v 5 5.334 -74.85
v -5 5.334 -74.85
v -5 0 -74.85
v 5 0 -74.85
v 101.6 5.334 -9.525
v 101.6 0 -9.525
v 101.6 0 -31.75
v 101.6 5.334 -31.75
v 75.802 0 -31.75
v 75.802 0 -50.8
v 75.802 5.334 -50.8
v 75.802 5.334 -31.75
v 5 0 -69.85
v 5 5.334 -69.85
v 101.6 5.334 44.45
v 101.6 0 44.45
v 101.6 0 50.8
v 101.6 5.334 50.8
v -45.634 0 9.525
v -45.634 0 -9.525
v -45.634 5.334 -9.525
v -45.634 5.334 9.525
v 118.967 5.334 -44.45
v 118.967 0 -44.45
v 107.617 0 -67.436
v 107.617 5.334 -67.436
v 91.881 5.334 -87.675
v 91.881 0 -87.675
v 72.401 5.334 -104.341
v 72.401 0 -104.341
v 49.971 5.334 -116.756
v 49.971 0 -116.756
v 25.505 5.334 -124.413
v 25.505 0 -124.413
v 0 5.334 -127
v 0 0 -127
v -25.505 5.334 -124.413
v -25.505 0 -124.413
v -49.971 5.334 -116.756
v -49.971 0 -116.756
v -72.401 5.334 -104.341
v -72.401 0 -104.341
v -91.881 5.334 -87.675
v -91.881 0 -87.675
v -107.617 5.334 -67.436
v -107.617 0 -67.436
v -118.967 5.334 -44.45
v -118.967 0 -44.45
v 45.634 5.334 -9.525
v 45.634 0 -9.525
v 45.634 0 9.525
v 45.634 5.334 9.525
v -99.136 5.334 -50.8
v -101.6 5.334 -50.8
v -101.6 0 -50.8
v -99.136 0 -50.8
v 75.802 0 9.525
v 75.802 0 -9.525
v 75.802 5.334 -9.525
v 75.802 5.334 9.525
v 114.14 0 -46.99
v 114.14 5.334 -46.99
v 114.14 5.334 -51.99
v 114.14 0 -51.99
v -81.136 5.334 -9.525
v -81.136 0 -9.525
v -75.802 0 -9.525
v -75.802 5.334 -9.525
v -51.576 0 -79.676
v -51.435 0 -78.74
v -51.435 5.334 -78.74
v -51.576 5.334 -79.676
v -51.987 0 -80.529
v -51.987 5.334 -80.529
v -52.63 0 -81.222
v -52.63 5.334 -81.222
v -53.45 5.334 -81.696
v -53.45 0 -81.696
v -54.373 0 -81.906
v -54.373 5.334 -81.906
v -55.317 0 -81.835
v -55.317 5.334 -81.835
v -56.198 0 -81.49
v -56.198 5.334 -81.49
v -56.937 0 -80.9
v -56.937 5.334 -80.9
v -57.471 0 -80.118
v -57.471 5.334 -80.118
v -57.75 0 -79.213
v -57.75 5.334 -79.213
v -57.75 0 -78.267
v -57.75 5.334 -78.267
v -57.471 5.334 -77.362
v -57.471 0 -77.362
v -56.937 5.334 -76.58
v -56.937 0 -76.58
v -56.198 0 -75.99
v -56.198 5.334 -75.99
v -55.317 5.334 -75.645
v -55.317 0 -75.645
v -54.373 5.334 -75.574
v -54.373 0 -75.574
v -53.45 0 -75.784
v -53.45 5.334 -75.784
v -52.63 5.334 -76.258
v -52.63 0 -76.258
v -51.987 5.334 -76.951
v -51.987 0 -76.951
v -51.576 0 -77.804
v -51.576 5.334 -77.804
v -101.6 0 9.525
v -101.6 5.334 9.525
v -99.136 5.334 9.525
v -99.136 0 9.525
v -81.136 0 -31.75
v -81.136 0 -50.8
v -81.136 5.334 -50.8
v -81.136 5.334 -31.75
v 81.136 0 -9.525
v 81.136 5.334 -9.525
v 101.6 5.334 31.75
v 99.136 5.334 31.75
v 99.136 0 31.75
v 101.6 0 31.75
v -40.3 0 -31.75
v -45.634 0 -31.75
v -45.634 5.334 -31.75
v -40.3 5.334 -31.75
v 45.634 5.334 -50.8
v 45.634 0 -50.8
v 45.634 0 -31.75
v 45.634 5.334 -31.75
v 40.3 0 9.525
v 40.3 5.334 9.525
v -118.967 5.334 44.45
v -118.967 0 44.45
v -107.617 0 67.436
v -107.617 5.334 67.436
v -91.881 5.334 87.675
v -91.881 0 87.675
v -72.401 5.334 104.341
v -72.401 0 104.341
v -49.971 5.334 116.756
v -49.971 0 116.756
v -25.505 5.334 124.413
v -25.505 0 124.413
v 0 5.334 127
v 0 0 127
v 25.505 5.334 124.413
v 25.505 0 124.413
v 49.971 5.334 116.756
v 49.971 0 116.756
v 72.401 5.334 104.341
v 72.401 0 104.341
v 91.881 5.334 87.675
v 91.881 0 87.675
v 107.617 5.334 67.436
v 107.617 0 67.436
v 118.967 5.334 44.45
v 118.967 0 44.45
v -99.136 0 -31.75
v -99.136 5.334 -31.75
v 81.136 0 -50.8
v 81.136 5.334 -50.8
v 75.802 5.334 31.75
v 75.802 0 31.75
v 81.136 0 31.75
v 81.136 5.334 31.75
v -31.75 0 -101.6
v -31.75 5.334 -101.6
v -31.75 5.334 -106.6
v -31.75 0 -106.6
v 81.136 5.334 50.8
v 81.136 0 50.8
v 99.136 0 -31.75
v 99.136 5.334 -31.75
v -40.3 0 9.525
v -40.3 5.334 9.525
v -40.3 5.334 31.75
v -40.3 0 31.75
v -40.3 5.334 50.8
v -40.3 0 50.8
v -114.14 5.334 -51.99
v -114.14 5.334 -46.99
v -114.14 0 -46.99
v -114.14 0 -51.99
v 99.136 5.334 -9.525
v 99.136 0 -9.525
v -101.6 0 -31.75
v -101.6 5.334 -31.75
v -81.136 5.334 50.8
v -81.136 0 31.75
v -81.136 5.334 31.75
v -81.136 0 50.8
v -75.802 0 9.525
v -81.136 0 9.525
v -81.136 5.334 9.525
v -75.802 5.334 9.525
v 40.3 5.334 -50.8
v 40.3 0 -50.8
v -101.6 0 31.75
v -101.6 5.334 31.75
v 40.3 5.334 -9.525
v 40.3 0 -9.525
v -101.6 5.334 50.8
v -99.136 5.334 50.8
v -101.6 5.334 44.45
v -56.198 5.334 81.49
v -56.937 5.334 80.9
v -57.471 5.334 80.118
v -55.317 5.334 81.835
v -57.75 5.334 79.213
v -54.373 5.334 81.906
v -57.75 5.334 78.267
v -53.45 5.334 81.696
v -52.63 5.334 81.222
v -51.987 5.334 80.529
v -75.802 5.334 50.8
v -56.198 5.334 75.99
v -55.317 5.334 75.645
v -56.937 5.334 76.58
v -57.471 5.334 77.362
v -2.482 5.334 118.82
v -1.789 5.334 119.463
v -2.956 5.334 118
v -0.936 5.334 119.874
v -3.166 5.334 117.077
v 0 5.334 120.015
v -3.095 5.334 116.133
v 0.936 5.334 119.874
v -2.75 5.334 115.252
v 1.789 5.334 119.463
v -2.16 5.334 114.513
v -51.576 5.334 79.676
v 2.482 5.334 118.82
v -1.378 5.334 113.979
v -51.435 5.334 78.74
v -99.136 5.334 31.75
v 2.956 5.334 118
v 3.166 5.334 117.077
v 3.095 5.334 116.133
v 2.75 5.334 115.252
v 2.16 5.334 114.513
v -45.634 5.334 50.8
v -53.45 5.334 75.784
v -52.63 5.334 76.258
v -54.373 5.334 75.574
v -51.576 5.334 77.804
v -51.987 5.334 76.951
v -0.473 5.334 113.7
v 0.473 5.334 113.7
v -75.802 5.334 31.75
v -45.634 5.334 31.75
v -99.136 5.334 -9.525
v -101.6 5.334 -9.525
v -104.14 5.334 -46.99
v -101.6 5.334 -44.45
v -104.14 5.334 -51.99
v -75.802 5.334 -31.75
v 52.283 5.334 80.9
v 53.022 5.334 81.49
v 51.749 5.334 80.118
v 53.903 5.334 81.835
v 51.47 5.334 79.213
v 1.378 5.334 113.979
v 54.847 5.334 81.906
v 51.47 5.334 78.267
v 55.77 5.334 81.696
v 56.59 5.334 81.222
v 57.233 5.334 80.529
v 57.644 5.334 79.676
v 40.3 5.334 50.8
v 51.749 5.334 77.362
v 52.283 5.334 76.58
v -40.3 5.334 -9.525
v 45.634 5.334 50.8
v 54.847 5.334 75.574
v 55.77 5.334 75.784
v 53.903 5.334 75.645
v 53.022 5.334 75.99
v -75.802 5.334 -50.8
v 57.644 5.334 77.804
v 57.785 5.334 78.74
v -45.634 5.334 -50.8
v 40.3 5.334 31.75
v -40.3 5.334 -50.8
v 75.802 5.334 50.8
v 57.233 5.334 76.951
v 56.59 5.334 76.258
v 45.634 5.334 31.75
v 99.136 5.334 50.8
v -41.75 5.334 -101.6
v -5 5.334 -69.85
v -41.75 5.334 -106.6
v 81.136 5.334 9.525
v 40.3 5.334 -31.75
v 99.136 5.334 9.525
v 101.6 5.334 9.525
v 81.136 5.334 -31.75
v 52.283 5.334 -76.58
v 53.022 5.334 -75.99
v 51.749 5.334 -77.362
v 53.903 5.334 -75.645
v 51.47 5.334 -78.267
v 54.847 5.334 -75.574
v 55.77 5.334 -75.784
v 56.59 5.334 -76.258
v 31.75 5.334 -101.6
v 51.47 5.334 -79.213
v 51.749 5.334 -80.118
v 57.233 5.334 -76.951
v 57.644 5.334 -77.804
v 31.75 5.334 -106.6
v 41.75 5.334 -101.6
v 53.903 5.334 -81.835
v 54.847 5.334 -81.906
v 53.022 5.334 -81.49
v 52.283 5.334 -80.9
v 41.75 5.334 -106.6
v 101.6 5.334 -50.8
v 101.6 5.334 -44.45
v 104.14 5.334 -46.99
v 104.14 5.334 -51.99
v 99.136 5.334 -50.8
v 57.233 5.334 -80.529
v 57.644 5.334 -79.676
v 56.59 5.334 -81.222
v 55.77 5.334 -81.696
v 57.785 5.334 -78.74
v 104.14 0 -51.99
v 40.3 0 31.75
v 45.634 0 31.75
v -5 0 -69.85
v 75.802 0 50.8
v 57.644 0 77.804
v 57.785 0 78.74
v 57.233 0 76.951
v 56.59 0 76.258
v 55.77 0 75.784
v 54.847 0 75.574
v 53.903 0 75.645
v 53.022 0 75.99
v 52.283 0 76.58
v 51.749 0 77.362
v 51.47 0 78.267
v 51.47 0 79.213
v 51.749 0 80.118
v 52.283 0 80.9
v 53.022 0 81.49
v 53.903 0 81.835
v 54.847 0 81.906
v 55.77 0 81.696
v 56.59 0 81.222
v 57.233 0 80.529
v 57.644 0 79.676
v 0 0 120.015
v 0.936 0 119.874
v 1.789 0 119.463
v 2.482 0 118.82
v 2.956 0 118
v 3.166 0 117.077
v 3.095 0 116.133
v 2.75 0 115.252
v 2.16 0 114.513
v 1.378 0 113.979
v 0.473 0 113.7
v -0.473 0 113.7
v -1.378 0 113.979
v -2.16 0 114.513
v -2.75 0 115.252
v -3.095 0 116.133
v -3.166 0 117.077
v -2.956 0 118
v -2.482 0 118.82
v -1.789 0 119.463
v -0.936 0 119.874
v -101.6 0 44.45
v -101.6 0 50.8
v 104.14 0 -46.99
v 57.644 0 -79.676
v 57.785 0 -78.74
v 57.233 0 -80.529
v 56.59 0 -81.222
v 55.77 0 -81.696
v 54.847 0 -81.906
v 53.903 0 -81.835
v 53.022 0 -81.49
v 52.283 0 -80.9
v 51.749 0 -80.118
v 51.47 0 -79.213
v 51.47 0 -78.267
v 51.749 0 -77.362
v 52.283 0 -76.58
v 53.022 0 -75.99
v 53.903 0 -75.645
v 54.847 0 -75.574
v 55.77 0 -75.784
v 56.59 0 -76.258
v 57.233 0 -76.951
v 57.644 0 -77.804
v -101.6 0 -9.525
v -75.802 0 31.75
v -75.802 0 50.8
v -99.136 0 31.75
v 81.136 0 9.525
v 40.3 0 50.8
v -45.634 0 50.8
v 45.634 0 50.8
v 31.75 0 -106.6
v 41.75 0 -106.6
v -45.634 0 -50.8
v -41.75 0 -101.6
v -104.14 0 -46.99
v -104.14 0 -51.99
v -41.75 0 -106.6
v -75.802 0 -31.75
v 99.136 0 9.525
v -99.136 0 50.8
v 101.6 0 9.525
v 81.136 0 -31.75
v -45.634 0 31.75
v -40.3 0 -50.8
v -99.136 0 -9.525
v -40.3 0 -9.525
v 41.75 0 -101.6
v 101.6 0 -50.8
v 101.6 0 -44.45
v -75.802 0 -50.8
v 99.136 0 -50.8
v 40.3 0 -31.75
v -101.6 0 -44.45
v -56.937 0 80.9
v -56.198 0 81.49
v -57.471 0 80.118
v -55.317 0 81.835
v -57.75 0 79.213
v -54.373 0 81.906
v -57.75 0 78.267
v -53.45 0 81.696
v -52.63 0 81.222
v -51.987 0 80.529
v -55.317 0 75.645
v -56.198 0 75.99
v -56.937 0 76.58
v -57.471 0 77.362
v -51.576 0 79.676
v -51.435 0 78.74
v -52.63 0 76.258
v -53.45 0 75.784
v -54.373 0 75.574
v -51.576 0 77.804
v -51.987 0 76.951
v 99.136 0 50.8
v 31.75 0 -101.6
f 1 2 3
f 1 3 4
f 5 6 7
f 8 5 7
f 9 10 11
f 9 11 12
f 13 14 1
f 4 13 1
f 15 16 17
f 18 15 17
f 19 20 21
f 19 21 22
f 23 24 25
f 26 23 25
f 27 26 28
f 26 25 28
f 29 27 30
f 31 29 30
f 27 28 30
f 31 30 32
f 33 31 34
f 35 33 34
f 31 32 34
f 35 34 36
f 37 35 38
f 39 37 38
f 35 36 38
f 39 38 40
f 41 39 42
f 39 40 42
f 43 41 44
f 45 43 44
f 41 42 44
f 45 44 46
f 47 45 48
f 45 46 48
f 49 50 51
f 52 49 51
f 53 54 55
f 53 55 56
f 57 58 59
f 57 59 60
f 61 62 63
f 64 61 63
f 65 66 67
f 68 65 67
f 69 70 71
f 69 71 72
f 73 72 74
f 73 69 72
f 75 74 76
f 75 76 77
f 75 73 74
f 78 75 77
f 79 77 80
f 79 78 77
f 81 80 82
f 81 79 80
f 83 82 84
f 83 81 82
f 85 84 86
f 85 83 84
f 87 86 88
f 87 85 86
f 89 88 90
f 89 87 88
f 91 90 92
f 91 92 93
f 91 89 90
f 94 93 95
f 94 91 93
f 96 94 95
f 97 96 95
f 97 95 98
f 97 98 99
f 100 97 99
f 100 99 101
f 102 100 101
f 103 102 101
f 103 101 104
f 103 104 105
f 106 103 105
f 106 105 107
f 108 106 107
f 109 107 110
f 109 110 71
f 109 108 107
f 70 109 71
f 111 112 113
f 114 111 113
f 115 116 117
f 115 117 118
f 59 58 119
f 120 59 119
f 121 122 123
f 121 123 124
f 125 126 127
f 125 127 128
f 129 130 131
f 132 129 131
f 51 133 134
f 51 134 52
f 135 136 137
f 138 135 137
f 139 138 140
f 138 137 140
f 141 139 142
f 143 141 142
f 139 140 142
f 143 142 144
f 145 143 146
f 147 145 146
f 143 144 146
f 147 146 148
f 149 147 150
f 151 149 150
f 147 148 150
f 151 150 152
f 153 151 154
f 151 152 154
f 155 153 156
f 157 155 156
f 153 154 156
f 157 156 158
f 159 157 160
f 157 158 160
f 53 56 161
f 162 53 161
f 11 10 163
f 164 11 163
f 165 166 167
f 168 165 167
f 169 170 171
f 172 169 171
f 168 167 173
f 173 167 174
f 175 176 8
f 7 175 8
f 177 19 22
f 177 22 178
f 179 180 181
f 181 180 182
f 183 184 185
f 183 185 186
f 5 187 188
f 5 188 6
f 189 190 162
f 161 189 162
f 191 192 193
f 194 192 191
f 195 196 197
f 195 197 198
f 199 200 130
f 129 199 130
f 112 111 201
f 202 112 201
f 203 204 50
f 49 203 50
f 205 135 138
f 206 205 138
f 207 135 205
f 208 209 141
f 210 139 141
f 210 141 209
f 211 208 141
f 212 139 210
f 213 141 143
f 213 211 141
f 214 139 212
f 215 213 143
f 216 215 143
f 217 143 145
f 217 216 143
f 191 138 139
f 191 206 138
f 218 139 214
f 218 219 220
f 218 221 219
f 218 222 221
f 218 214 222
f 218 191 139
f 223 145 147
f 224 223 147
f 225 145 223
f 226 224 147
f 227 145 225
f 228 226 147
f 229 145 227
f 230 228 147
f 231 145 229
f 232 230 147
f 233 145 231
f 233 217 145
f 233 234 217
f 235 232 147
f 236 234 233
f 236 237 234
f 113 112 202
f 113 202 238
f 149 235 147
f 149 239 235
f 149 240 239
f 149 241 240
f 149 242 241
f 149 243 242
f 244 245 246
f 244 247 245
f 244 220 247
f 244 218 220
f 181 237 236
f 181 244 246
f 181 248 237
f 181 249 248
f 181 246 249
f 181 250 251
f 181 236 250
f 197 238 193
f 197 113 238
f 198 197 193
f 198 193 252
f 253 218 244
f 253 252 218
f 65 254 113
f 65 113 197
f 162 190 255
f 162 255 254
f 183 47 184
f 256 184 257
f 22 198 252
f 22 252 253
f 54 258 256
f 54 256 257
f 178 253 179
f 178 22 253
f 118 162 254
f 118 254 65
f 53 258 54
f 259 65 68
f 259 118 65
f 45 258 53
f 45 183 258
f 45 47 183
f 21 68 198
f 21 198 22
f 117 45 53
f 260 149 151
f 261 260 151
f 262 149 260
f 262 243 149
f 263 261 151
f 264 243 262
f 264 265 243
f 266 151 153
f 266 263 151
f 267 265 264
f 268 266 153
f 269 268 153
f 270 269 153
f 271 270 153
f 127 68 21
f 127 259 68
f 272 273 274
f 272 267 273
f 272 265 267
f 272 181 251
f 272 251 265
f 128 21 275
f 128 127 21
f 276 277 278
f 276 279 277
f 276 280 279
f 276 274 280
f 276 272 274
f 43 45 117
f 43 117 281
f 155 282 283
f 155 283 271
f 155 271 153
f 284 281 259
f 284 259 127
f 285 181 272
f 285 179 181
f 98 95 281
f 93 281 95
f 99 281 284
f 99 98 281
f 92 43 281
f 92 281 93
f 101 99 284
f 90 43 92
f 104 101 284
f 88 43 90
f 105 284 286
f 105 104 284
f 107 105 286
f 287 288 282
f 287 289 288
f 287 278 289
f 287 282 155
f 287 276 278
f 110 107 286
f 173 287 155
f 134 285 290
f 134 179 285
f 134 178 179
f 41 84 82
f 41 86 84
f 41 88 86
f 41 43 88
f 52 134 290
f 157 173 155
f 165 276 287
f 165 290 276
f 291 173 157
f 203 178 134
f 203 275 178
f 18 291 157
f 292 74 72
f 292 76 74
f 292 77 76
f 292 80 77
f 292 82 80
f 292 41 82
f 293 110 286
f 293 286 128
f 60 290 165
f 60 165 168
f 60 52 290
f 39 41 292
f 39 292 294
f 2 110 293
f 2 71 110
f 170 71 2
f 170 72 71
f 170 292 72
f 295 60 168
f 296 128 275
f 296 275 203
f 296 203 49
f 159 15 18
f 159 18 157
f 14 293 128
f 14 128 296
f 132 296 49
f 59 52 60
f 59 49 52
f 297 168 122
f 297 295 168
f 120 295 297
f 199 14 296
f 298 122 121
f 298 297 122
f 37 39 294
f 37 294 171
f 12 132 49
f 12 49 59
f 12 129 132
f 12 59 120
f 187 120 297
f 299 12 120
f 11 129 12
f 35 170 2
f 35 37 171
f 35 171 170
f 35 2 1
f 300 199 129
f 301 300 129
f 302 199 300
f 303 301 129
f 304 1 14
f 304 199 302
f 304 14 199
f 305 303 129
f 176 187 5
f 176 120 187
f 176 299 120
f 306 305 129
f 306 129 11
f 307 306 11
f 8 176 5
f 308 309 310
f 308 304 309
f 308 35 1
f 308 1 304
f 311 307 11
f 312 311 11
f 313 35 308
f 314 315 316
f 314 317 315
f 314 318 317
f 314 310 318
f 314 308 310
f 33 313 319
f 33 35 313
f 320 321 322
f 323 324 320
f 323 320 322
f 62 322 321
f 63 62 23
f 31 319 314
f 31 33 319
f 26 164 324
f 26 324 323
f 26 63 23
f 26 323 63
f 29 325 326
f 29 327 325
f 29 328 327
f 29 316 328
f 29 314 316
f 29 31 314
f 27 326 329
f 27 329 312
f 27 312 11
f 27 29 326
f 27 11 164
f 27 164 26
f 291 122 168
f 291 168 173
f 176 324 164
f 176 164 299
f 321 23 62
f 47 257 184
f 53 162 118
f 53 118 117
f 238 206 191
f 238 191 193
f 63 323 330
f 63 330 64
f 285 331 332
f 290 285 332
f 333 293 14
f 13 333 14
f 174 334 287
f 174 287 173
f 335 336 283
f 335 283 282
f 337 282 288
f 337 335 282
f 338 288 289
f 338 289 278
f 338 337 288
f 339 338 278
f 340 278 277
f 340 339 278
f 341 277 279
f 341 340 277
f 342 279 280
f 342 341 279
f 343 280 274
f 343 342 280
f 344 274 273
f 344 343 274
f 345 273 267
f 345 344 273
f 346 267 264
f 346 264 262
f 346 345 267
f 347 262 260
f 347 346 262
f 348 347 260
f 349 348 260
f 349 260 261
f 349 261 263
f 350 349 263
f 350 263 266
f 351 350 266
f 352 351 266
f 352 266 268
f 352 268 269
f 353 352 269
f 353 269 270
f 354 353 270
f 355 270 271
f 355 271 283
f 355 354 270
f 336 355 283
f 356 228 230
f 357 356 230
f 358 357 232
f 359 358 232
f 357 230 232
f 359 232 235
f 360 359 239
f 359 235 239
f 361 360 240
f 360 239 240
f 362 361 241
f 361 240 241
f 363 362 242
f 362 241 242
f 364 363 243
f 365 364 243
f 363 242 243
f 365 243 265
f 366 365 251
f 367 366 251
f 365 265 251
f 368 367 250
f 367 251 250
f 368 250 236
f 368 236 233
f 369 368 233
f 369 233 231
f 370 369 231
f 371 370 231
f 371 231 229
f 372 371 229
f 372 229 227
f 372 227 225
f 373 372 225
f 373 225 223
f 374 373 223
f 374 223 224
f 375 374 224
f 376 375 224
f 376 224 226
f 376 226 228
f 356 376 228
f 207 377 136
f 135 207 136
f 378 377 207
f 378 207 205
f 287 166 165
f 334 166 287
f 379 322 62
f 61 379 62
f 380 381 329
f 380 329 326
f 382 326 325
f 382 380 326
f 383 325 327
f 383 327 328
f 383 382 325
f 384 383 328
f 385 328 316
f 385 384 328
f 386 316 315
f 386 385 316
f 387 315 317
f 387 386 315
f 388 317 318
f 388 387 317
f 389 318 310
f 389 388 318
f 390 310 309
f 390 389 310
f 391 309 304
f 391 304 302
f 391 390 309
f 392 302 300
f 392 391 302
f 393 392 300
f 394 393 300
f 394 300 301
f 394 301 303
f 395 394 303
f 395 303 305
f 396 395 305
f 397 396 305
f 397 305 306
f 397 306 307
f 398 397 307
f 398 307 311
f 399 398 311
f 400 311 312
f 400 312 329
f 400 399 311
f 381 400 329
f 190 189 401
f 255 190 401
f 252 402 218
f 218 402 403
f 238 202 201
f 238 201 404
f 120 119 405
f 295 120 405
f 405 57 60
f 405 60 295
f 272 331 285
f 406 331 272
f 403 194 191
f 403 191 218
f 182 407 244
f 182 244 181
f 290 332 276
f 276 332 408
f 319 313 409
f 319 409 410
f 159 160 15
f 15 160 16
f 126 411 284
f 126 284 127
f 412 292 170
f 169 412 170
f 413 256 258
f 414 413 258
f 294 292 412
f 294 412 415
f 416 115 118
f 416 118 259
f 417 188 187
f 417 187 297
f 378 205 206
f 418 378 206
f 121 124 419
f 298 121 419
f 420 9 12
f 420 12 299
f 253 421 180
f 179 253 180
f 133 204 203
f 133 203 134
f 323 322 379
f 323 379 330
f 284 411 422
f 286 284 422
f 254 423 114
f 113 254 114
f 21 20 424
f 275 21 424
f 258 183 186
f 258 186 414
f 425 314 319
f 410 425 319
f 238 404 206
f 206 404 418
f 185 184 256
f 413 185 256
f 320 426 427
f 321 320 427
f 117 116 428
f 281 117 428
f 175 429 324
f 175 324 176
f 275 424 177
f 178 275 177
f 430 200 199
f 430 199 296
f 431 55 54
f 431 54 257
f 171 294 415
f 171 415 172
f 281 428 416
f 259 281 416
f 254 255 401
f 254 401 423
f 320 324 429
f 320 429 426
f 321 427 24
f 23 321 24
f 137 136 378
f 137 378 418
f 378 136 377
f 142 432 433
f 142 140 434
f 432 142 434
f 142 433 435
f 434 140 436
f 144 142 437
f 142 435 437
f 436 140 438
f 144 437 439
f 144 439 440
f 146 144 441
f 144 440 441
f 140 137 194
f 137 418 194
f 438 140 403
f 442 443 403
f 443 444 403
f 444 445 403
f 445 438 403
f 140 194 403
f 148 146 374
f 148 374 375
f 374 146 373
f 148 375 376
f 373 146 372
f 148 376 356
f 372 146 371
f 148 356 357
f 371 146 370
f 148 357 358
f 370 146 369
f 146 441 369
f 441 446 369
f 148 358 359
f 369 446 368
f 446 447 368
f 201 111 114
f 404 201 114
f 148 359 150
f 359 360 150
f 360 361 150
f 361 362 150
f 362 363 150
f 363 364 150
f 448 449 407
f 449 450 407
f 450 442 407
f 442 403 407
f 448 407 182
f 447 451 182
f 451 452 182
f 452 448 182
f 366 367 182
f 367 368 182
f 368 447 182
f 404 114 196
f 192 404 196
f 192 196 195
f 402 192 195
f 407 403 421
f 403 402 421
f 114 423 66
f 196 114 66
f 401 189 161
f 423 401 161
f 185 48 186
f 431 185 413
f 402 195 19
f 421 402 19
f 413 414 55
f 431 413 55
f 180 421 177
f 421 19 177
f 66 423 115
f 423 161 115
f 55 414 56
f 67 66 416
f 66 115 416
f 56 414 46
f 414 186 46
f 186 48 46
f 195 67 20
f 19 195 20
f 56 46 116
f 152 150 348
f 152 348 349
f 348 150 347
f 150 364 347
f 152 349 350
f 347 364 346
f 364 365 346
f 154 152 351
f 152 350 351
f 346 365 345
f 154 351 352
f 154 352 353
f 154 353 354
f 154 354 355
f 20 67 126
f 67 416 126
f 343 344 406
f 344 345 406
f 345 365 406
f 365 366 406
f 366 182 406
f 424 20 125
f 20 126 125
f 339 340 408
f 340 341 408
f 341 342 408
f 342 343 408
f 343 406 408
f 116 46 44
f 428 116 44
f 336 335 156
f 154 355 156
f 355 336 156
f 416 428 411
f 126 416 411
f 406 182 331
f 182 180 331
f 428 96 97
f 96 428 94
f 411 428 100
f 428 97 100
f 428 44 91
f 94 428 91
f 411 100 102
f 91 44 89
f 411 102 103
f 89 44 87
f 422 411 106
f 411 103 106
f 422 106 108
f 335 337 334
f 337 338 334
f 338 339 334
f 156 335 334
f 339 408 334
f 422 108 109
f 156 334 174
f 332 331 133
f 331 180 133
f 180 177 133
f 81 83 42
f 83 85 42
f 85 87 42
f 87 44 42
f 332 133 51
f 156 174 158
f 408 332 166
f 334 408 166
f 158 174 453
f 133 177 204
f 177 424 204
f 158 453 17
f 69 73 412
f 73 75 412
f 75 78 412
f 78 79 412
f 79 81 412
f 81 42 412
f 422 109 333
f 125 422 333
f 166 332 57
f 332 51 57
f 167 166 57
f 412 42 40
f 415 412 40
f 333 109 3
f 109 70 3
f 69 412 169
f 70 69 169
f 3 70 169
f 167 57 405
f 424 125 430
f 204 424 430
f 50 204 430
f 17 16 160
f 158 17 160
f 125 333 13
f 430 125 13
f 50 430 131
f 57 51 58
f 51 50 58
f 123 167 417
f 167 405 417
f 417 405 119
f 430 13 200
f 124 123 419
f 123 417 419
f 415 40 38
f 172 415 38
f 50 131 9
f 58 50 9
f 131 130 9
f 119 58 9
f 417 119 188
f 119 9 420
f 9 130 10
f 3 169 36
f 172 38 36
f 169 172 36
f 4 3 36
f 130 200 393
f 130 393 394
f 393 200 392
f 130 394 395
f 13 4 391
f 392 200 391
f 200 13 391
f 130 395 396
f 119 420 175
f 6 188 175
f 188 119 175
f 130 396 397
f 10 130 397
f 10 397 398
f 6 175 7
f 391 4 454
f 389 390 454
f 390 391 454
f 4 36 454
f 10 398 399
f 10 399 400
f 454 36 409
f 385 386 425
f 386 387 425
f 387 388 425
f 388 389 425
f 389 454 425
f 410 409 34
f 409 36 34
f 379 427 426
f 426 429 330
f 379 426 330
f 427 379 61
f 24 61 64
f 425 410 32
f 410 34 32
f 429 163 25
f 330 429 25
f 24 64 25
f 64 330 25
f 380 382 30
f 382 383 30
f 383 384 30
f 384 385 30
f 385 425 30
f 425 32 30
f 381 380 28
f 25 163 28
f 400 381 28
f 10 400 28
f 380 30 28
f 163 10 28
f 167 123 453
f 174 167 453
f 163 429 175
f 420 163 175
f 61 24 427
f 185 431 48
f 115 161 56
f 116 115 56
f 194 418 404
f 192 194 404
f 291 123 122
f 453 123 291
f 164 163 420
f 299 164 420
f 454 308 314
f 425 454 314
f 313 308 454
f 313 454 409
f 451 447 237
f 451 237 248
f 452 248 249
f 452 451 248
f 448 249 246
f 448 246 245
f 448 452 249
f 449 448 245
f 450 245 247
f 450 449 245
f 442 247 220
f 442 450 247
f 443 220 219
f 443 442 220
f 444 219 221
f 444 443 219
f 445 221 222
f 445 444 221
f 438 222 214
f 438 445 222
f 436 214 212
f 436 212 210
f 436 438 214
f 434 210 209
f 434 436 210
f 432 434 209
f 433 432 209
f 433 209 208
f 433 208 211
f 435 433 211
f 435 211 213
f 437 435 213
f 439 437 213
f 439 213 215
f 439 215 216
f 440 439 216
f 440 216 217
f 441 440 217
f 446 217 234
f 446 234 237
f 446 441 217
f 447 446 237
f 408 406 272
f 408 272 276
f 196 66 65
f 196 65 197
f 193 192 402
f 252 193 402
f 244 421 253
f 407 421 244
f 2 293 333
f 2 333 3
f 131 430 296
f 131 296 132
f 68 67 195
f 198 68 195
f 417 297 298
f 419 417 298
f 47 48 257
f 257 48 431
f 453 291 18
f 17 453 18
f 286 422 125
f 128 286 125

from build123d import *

# Parameters (mm, degrees)
BASE_DEPTH                = 5.334
SKETCH9_W                 = 10
SKETCH9_H                 = 5
TAPE_SENSOR_CUTOUTS_DEPTH = 175.099537782
SKETCH6_W                 = 5.334
SKETCH6_H                 = 19.05
SKETCH6_W_2               = 2.4638
RIGHT_MOUNT_SLOTS_DEPTH   = 175.099537782
SKETCH7_W                 = 5.334
SKETCH7_H                 = 19.05
SKETCH7_W_2               = 2.4638
LEFT_MOUNT_SLOTS_DEPTH    = 175.099537782
SKETCH8_R                 = 3.175
CASTER_SCREWS_DEPTH       = 175.099537782
HOLE1_OUTLINE_R           = 3.175
HOLE1_DEPTH               = 5.334


# Read off the part's stored shape, not the designer's step: Hole1
with BuildPart() as part:
    # Sketch1 → Base (new body)
    with BuildSketch(Plane(origin=(0, 0, 0), x_dir=(1, 0, 0), z_dir=(0, 1, 0))):
        with BuildLine():
            Line((118.967211869, -44.45), (101.6, -44.45))
            Line((101.6, -44.45), (101.6, 44.45))
            Line((101.6, 44.45), (118.967211869, 44.45))
            ThreePointArc((118.967211869, 44.45), (0, 127), (-118.967211869, 44.45))
            Line((-118.967211869, 44.45), (-101.6, 44.45))
            Line((-101.6, 44.45), (-101.6, -44.45))
            Line((-101.6, -44.45), (-118.967211869, -44.45))
            ThreePointArc((-118.967211869, -44.45), (0, -127), (118.967211869, -44.45))
        make_face()
    extrude(amount=BASE_DEPTH)

    # Sketch9 → Tape Sensor Cutouts (cut, through all)
    with BuildSketch(Plane(origin=(0, 5.334, 0), x_dir=(1, 0, 0), z_dir=(0, 1, 0))):
        with Locations((-36.75, 104.1)):
            Rectangle(SKETCH9_W, SKETCH9_H)
        with Locations((36.75, 104.1)):
            Rectangle(SKETCH9_W, SKETCH9_H)
        with Locations((0, 72.35)):
            Rectangle(SKETCH9_W, SKETCH9_H)
        with Locations((-109.14, 49.49)):
            Rectangle(SKETCH9_W, SKETCH9_H)
        with Locations((109.14, 49.49)):
            Rectangle(SKETCH9_W, SKETCH9_H)
    extrude(amount=-TAPE_SENSOR_CUTOUTS_DEPTH, mode=Mode.SUBTRACT)

    # Sketch6 → Right Mount Slots (cut, through all)
    with BuildSketch(Plane.XZ):
        with Locations((42.967, 41.275)):
            Rectangle(SKETCH6_W, SKETCH6_H)
        with Locations((42.967, 0)):
            Rectangle(SKETCH6_W, SKETCH6_H)
        with Locations((42.967, -41.275)):
            Rectangle(SKETCH6_W, SKETCH6_H)
        with Locations((100.3681, 41.275)):
            Rectangle(SKETCH6_W_2, SKETCH6_H)
        with Locations((100.3681, 0)):
            Rectangle(SKETCH6_W_2, SKETCH6_H)
        with Locations((100.3681, -41.275)):
            Rectangle(SKETCH6_W_2, SKETCH6_H)
        with Locations((78.4692, 41.275)):
            Rectangle(SKETCH6_W, SKETCH6_H)
        with Locations((78.4692, 0)):
            Rectangle(SKETCH6_W, SKETCH6_H)
        with Locations((78.4692, -41.275)):
            Rectangle(SKETCH6_W, SKETCH6_H)
    extrude(amount=-RIGHT_MOUNT_SLOTS_DEPTH, mode=Mode.SUBTRACT)

    # Sketch7 → Left Mount Slots (cut, through all)
    with BuildSketch(Plane.XZ):
        with Locations((-78.4692, 0)):
            Rectangle(SKETCH7_W, SKETCH7_H)
        with Locations((-78.4692, 41.275)):
            Rectangle(SKETCH7_W, SKETCH7_H)
        with Locations((-78.4692, -41.275)):
            Rectangle(SKETCH7_W, SKETCH7_H)
        with Locations((-42.967, 41.275)):
            Rectangle(SKETCH7_W, SKETCH7_H)
        with Locations((-42.967, 0)):
            Rectangle(SKETCH7_W, SKETCH7_H)
        with Locations((-42.967, -41.275)):
            Rectangle(SKETCH7_W, SKETCH7_H)
        with Locations((-100.3681, 41.275)):
            Rectangle(SKETCH7_W_2, SKETCH7_H)
        with Locations((-100.3681, 0)):
            Rectangle(SKETCH7_W_2, SKETCH7_H)
        with Locations((-100.3681, -41.275)):
            Rectangle(SKETCH7_W_2, SKETCH7_H)
    extrude(amount=-LEFT_MOUNT_SLOTS_DEPTH, mode=Mode.SUBTRACT)

    # Sketch8 → Caster Screws (cut, through all)
    with BuildSketch(Plane(origin=(0, 5.334, 0), x_dir=(1, 0, 0), z_dir=(0, 1, 0))):
        with Locations(Location((0, -116.84, 0), (0, 0, 270))):
            Circle(SKETCH8_R)
    extrude(amount=-CASTER_SCREWS_DEPTH, mode=Mode.SUBTRACT)

    # Hole1 outline → Hole1 (cut)
    with BuildSketch(Plane(origin=(0, 0, 0), x_dir=(1, 0, 0), z_dir=(0, 1, 0))):
        with Locations((-54.61, -78.74)):
            Circle(HOLE1_OUTLINE_R)
        with Locations((54.61, -78.74)):
            Circle(HOLE1_OUTLINE_R)
        with Locations((54.61, 78.74)):
            Circle(HOLE1_OUTLINE_R)
        with Locations((-54.61, 78.74)):
            Circle(HOLE1_OUTLINE_R)
    extrude(amount=HOLE1_DEPTH, mode=Mode.SUBTRACT)


solid = part.part
